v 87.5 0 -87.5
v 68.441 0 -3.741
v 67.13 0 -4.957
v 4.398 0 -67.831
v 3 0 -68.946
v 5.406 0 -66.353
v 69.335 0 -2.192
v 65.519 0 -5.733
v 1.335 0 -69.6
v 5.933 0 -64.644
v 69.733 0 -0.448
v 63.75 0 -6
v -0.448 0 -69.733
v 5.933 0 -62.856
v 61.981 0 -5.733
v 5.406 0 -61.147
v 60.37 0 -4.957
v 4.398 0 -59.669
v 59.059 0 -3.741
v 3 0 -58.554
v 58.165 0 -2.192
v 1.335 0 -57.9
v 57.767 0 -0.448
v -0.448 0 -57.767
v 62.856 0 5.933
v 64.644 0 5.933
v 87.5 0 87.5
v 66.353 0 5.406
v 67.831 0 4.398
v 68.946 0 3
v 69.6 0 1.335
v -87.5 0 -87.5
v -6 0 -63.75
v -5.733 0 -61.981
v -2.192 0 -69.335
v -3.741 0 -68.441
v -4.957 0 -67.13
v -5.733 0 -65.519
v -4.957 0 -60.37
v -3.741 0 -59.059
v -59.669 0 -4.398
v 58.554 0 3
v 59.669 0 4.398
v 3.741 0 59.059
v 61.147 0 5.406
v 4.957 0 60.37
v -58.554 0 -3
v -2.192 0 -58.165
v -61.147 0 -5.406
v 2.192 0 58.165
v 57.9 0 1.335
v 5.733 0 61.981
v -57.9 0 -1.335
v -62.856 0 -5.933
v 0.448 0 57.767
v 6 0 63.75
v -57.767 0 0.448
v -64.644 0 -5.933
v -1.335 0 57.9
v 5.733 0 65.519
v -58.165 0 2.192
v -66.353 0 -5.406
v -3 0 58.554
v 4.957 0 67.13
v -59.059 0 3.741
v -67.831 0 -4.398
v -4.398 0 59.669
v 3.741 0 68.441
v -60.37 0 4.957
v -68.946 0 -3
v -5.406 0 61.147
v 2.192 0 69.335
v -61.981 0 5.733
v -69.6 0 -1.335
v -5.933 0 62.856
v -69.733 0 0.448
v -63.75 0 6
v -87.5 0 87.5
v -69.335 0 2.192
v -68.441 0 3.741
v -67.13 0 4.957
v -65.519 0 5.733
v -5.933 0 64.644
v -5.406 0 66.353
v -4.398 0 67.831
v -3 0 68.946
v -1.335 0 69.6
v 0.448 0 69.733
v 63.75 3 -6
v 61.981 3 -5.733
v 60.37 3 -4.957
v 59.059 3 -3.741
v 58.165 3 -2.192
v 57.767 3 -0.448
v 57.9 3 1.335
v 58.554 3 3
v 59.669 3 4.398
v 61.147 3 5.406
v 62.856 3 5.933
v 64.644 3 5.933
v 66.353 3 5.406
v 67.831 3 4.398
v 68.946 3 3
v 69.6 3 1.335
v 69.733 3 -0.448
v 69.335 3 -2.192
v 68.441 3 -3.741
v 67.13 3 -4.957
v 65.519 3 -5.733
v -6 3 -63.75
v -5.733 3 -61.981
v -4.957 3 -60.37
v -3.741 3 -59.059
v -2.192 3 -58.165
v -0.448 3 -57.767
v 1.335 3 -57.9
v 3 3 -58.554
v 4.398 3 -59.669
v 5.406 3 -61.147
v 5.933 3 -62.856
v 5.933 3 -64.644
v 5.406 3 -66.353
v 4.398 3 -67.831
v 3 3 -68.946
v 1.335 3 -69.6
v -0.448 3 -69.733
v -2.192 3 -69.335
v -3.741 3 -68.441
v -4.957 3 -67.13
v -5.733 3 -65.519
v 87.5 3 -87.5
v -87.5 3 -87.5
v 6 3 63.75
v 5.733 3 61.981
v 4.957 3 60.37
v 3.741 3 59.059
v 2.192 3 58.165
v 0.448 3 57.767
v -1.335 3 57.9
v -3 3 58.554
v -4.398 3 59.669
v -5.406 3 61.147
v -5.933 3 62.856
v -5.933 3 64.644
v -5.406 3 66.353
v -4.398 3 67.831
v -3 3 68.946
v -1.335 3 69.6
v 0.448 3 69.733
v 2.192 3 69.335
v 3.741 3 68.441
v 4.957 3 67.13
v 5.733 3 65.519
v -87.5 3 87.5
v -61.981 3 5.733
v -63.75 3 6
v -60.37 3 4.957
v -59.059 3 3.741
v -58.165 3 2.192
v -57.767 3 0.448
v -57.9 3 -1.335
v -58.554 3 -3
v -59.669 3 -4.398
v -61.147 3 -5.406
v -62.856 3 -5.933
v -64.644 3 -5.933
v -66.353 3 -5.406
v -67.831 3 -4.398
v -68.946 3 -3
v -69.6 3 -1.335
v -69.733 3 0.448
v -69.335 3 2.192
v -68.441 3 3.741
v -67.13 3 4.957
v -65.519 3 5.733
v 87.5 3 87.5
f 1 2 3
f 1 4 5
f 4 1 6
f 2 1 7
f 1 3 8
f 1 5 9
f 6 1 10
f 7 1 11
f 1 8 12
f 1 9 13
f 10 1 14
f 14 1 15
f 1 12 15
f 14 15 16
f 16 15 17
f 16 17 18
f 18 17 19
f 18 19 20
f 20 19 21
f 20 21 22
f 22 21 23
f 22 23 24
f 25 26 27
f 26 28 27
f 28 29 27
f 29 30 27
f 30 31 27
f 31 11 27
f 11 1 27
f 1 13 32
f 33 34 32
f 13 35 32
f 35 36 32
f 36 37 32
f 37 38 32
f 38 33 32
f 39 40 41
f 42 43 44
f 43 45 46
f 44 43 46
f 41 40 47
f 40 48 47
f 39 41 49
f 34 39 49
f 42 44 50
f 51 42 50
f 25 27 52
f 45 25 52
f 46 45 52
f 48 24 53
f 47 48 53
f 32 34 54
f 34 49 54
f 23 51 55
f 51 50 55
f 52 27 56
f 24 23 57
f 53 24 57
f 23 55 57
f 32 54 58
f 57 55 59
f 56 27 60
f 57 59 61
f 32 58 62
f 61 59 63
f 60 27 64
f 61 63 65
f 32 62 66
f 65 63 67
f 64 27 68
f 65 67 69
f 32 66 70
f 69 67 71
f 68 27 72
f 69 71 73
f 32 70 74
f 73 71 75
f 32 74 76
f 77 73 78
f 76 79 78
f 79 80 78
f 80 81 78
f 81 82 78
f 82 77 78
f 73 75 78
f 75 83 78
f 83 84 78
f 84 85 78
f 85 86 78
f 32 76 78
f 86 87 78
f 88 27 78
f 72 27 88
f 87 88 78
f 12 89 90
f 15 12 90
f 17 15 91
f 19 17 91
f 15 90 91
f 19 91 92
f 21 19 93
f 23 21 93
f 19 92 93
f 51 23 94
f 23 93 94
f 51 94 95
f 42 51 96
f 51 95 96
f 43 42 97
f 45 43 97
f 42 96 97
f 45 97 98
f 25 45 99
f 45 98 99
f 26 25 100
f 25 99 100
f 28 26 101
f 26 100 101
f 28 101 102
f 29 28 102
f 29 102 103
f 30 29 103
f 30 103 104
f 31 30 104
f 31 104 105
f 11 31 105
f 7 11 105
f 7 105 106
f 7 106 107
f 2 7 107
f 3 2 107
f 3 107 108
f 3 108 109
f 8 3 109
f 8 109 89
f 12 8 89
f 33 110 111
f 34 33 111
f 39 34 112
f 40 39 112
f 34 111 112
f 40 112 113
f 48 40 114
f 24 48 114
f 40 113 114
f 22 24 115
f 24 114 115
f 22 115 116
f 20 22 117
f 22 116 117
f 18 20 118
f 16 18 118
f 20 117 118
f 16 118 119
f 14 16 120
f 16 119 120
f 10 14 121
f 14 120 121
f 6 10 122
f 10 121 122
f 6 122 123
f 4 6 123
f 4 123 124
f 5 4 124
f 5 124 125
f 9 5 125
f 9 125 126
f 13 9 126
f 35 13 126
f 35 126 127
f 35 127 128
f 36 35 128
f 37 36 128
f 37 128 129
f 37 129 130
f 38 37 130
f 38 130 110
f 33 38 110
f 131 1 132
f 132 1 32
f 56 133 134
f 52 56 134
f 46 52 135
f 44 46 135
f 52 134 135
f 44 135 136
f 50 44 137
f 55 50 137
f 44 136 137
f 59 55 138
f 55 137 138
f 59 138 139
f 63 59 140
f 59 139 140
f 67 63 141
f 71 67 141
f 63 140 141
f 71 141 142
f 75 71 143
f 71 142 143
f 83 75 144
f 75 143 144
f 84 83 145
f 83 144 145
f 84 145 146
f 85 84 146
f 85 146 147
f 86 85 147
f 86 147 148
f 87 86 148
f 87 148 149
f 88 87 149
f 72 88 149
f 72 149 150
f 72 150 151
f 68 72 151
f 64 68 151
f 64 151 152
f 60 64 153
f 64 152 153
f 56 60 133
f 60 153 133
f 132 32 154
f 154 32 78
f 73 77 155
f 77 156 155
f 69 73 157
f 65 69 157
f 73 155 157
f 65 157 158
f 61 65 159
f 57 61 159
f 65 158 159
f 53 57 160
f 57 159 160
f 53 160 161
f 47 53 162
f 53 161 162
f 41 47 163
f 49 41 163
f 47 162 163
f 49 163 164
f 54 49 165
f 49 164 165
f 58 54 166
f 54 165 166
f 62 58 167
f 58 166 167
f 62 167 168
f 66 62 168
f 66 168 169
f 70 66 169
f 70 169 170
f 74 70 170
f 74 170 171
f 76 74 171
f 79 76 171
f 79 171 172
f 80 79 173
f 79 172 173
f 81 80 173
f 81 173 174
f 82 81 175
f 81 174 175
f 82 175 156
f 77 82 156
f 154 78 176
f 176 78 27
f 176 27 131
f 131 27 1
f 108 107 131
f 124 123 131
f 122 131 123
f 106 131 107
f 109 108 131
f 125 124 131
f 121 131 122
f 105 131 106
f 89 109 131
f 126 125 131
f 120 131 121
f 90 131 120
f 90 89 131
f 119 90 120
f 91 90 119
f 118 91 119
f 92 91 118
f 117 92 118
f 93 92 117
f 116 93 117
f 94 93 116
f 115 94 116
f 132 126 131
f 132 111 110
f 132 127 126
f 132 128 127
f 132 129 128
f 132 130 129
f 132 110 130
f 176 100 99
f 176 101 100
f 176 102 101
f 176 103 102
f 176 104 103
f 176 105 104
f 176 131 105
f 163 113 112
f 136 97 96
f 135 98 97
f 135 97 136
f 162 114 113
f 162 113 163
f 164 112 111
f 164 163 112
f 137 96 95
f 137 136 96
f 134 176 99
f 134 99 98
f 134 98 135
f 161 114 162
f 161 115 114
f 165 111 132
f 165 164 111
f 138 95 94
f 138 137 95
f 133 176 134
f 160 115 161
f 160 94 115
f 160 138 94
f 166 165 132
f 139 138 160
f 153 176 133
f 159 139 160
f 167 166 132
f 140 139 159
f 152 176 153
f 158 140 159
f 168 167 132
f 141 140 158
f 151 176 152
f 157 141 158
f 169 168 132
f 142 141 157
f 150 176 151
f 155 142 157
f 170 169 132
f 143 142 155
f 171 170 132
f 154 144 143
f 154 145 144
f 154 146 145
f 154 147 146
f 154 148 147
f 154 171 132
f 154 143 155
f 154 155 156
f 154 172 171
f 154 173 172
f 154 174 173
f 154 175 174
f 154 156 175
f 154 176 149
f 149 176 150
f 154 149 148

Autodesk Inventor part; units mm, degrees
ref_plane "YZ Plane" through (0, 0, 0) normal (1, 0, 0) x (0, 1, 0)
ref_plane "XZ Plane" through (0, 0, 0) normal (0, 1, 0) x (-1, 0, 0)
ref_plane "XY Plane" through (0, 0, 0) normal (0, 0, 1) x (1, 0, 0)
sketch "Sketch1" plane through (0, 0, 0) normal (0, 1, 0) x (-1, 0, 0)
  line L0 (87.5, 87.5) -> (-87.5, 87.5)
  line L1 (-87.5, 87.5) -> (-87.5, -87.5)
  line L2 (-87.5, -87.5) -> (87.5, -87.5)
  line L3 (87.5, -87.5) -> (87.5, 87.5)
  line L4 (87.5, 87.5) -> (-87.5, -87.5) construction
  line L5 (40, 40) -> (-40, 40) construction
  line L6 (-40, 40) -> (-40, -40) construction
  line L7 (-40, -40) -> (40, -40) construction
  line L8 (40, -40) -> (40, 40) construction
  line L9 (-40, 40) -> (40, -40) construction
  point P0 (0, 0)
  point P1 (0, 0)
  point P2 (0, 87.5)
  dimension "d0" = 175
  dimension "d1" = 175
  dimension "d2" = 80
  dimension "d3" = 80
extrude "Plate1" add sketch "Sketch1" along normal blind 3
sketch "Sketch2" plane through (0, 3, 0) normal (0, 1, 0) x (1, 0, 0)
  circle A0 centre (0, -63.75) radius 6
  line L0 (87.5, -87.5) -> (-87.5, -87.5) projected
  point P0 (0, 0)
  point P1 (0, -87.5)
  dimension "d7" = 23.75
  dimension "d8" = 12
extrude "Extrusion1" cut sketch "Sketch2" against normal blind 10
pattern_circular "Circular Pattern1" count 4 over 360 about axis through (0, -10, 0) along (0, 1, 0) of "Extrusion1"
equation "\"BendReliefWidth\" = Thickness"
equation "\"BendReliefDepth\" = 0.5 * Thickness"
equation "\"CornerReliefSize\" = 4 * Thickness"
equation "\"MinimumRemnant\" = 2 * Thickness"
equation "\"TransitionRadius\" = BendRadius"
equation "\"JacobiRadiusSize\" = BendRadius"
equation "\"GapSize\" = Thickness"
properties part number "MSC 127 flange frame heel" material "Stainless Steel"
